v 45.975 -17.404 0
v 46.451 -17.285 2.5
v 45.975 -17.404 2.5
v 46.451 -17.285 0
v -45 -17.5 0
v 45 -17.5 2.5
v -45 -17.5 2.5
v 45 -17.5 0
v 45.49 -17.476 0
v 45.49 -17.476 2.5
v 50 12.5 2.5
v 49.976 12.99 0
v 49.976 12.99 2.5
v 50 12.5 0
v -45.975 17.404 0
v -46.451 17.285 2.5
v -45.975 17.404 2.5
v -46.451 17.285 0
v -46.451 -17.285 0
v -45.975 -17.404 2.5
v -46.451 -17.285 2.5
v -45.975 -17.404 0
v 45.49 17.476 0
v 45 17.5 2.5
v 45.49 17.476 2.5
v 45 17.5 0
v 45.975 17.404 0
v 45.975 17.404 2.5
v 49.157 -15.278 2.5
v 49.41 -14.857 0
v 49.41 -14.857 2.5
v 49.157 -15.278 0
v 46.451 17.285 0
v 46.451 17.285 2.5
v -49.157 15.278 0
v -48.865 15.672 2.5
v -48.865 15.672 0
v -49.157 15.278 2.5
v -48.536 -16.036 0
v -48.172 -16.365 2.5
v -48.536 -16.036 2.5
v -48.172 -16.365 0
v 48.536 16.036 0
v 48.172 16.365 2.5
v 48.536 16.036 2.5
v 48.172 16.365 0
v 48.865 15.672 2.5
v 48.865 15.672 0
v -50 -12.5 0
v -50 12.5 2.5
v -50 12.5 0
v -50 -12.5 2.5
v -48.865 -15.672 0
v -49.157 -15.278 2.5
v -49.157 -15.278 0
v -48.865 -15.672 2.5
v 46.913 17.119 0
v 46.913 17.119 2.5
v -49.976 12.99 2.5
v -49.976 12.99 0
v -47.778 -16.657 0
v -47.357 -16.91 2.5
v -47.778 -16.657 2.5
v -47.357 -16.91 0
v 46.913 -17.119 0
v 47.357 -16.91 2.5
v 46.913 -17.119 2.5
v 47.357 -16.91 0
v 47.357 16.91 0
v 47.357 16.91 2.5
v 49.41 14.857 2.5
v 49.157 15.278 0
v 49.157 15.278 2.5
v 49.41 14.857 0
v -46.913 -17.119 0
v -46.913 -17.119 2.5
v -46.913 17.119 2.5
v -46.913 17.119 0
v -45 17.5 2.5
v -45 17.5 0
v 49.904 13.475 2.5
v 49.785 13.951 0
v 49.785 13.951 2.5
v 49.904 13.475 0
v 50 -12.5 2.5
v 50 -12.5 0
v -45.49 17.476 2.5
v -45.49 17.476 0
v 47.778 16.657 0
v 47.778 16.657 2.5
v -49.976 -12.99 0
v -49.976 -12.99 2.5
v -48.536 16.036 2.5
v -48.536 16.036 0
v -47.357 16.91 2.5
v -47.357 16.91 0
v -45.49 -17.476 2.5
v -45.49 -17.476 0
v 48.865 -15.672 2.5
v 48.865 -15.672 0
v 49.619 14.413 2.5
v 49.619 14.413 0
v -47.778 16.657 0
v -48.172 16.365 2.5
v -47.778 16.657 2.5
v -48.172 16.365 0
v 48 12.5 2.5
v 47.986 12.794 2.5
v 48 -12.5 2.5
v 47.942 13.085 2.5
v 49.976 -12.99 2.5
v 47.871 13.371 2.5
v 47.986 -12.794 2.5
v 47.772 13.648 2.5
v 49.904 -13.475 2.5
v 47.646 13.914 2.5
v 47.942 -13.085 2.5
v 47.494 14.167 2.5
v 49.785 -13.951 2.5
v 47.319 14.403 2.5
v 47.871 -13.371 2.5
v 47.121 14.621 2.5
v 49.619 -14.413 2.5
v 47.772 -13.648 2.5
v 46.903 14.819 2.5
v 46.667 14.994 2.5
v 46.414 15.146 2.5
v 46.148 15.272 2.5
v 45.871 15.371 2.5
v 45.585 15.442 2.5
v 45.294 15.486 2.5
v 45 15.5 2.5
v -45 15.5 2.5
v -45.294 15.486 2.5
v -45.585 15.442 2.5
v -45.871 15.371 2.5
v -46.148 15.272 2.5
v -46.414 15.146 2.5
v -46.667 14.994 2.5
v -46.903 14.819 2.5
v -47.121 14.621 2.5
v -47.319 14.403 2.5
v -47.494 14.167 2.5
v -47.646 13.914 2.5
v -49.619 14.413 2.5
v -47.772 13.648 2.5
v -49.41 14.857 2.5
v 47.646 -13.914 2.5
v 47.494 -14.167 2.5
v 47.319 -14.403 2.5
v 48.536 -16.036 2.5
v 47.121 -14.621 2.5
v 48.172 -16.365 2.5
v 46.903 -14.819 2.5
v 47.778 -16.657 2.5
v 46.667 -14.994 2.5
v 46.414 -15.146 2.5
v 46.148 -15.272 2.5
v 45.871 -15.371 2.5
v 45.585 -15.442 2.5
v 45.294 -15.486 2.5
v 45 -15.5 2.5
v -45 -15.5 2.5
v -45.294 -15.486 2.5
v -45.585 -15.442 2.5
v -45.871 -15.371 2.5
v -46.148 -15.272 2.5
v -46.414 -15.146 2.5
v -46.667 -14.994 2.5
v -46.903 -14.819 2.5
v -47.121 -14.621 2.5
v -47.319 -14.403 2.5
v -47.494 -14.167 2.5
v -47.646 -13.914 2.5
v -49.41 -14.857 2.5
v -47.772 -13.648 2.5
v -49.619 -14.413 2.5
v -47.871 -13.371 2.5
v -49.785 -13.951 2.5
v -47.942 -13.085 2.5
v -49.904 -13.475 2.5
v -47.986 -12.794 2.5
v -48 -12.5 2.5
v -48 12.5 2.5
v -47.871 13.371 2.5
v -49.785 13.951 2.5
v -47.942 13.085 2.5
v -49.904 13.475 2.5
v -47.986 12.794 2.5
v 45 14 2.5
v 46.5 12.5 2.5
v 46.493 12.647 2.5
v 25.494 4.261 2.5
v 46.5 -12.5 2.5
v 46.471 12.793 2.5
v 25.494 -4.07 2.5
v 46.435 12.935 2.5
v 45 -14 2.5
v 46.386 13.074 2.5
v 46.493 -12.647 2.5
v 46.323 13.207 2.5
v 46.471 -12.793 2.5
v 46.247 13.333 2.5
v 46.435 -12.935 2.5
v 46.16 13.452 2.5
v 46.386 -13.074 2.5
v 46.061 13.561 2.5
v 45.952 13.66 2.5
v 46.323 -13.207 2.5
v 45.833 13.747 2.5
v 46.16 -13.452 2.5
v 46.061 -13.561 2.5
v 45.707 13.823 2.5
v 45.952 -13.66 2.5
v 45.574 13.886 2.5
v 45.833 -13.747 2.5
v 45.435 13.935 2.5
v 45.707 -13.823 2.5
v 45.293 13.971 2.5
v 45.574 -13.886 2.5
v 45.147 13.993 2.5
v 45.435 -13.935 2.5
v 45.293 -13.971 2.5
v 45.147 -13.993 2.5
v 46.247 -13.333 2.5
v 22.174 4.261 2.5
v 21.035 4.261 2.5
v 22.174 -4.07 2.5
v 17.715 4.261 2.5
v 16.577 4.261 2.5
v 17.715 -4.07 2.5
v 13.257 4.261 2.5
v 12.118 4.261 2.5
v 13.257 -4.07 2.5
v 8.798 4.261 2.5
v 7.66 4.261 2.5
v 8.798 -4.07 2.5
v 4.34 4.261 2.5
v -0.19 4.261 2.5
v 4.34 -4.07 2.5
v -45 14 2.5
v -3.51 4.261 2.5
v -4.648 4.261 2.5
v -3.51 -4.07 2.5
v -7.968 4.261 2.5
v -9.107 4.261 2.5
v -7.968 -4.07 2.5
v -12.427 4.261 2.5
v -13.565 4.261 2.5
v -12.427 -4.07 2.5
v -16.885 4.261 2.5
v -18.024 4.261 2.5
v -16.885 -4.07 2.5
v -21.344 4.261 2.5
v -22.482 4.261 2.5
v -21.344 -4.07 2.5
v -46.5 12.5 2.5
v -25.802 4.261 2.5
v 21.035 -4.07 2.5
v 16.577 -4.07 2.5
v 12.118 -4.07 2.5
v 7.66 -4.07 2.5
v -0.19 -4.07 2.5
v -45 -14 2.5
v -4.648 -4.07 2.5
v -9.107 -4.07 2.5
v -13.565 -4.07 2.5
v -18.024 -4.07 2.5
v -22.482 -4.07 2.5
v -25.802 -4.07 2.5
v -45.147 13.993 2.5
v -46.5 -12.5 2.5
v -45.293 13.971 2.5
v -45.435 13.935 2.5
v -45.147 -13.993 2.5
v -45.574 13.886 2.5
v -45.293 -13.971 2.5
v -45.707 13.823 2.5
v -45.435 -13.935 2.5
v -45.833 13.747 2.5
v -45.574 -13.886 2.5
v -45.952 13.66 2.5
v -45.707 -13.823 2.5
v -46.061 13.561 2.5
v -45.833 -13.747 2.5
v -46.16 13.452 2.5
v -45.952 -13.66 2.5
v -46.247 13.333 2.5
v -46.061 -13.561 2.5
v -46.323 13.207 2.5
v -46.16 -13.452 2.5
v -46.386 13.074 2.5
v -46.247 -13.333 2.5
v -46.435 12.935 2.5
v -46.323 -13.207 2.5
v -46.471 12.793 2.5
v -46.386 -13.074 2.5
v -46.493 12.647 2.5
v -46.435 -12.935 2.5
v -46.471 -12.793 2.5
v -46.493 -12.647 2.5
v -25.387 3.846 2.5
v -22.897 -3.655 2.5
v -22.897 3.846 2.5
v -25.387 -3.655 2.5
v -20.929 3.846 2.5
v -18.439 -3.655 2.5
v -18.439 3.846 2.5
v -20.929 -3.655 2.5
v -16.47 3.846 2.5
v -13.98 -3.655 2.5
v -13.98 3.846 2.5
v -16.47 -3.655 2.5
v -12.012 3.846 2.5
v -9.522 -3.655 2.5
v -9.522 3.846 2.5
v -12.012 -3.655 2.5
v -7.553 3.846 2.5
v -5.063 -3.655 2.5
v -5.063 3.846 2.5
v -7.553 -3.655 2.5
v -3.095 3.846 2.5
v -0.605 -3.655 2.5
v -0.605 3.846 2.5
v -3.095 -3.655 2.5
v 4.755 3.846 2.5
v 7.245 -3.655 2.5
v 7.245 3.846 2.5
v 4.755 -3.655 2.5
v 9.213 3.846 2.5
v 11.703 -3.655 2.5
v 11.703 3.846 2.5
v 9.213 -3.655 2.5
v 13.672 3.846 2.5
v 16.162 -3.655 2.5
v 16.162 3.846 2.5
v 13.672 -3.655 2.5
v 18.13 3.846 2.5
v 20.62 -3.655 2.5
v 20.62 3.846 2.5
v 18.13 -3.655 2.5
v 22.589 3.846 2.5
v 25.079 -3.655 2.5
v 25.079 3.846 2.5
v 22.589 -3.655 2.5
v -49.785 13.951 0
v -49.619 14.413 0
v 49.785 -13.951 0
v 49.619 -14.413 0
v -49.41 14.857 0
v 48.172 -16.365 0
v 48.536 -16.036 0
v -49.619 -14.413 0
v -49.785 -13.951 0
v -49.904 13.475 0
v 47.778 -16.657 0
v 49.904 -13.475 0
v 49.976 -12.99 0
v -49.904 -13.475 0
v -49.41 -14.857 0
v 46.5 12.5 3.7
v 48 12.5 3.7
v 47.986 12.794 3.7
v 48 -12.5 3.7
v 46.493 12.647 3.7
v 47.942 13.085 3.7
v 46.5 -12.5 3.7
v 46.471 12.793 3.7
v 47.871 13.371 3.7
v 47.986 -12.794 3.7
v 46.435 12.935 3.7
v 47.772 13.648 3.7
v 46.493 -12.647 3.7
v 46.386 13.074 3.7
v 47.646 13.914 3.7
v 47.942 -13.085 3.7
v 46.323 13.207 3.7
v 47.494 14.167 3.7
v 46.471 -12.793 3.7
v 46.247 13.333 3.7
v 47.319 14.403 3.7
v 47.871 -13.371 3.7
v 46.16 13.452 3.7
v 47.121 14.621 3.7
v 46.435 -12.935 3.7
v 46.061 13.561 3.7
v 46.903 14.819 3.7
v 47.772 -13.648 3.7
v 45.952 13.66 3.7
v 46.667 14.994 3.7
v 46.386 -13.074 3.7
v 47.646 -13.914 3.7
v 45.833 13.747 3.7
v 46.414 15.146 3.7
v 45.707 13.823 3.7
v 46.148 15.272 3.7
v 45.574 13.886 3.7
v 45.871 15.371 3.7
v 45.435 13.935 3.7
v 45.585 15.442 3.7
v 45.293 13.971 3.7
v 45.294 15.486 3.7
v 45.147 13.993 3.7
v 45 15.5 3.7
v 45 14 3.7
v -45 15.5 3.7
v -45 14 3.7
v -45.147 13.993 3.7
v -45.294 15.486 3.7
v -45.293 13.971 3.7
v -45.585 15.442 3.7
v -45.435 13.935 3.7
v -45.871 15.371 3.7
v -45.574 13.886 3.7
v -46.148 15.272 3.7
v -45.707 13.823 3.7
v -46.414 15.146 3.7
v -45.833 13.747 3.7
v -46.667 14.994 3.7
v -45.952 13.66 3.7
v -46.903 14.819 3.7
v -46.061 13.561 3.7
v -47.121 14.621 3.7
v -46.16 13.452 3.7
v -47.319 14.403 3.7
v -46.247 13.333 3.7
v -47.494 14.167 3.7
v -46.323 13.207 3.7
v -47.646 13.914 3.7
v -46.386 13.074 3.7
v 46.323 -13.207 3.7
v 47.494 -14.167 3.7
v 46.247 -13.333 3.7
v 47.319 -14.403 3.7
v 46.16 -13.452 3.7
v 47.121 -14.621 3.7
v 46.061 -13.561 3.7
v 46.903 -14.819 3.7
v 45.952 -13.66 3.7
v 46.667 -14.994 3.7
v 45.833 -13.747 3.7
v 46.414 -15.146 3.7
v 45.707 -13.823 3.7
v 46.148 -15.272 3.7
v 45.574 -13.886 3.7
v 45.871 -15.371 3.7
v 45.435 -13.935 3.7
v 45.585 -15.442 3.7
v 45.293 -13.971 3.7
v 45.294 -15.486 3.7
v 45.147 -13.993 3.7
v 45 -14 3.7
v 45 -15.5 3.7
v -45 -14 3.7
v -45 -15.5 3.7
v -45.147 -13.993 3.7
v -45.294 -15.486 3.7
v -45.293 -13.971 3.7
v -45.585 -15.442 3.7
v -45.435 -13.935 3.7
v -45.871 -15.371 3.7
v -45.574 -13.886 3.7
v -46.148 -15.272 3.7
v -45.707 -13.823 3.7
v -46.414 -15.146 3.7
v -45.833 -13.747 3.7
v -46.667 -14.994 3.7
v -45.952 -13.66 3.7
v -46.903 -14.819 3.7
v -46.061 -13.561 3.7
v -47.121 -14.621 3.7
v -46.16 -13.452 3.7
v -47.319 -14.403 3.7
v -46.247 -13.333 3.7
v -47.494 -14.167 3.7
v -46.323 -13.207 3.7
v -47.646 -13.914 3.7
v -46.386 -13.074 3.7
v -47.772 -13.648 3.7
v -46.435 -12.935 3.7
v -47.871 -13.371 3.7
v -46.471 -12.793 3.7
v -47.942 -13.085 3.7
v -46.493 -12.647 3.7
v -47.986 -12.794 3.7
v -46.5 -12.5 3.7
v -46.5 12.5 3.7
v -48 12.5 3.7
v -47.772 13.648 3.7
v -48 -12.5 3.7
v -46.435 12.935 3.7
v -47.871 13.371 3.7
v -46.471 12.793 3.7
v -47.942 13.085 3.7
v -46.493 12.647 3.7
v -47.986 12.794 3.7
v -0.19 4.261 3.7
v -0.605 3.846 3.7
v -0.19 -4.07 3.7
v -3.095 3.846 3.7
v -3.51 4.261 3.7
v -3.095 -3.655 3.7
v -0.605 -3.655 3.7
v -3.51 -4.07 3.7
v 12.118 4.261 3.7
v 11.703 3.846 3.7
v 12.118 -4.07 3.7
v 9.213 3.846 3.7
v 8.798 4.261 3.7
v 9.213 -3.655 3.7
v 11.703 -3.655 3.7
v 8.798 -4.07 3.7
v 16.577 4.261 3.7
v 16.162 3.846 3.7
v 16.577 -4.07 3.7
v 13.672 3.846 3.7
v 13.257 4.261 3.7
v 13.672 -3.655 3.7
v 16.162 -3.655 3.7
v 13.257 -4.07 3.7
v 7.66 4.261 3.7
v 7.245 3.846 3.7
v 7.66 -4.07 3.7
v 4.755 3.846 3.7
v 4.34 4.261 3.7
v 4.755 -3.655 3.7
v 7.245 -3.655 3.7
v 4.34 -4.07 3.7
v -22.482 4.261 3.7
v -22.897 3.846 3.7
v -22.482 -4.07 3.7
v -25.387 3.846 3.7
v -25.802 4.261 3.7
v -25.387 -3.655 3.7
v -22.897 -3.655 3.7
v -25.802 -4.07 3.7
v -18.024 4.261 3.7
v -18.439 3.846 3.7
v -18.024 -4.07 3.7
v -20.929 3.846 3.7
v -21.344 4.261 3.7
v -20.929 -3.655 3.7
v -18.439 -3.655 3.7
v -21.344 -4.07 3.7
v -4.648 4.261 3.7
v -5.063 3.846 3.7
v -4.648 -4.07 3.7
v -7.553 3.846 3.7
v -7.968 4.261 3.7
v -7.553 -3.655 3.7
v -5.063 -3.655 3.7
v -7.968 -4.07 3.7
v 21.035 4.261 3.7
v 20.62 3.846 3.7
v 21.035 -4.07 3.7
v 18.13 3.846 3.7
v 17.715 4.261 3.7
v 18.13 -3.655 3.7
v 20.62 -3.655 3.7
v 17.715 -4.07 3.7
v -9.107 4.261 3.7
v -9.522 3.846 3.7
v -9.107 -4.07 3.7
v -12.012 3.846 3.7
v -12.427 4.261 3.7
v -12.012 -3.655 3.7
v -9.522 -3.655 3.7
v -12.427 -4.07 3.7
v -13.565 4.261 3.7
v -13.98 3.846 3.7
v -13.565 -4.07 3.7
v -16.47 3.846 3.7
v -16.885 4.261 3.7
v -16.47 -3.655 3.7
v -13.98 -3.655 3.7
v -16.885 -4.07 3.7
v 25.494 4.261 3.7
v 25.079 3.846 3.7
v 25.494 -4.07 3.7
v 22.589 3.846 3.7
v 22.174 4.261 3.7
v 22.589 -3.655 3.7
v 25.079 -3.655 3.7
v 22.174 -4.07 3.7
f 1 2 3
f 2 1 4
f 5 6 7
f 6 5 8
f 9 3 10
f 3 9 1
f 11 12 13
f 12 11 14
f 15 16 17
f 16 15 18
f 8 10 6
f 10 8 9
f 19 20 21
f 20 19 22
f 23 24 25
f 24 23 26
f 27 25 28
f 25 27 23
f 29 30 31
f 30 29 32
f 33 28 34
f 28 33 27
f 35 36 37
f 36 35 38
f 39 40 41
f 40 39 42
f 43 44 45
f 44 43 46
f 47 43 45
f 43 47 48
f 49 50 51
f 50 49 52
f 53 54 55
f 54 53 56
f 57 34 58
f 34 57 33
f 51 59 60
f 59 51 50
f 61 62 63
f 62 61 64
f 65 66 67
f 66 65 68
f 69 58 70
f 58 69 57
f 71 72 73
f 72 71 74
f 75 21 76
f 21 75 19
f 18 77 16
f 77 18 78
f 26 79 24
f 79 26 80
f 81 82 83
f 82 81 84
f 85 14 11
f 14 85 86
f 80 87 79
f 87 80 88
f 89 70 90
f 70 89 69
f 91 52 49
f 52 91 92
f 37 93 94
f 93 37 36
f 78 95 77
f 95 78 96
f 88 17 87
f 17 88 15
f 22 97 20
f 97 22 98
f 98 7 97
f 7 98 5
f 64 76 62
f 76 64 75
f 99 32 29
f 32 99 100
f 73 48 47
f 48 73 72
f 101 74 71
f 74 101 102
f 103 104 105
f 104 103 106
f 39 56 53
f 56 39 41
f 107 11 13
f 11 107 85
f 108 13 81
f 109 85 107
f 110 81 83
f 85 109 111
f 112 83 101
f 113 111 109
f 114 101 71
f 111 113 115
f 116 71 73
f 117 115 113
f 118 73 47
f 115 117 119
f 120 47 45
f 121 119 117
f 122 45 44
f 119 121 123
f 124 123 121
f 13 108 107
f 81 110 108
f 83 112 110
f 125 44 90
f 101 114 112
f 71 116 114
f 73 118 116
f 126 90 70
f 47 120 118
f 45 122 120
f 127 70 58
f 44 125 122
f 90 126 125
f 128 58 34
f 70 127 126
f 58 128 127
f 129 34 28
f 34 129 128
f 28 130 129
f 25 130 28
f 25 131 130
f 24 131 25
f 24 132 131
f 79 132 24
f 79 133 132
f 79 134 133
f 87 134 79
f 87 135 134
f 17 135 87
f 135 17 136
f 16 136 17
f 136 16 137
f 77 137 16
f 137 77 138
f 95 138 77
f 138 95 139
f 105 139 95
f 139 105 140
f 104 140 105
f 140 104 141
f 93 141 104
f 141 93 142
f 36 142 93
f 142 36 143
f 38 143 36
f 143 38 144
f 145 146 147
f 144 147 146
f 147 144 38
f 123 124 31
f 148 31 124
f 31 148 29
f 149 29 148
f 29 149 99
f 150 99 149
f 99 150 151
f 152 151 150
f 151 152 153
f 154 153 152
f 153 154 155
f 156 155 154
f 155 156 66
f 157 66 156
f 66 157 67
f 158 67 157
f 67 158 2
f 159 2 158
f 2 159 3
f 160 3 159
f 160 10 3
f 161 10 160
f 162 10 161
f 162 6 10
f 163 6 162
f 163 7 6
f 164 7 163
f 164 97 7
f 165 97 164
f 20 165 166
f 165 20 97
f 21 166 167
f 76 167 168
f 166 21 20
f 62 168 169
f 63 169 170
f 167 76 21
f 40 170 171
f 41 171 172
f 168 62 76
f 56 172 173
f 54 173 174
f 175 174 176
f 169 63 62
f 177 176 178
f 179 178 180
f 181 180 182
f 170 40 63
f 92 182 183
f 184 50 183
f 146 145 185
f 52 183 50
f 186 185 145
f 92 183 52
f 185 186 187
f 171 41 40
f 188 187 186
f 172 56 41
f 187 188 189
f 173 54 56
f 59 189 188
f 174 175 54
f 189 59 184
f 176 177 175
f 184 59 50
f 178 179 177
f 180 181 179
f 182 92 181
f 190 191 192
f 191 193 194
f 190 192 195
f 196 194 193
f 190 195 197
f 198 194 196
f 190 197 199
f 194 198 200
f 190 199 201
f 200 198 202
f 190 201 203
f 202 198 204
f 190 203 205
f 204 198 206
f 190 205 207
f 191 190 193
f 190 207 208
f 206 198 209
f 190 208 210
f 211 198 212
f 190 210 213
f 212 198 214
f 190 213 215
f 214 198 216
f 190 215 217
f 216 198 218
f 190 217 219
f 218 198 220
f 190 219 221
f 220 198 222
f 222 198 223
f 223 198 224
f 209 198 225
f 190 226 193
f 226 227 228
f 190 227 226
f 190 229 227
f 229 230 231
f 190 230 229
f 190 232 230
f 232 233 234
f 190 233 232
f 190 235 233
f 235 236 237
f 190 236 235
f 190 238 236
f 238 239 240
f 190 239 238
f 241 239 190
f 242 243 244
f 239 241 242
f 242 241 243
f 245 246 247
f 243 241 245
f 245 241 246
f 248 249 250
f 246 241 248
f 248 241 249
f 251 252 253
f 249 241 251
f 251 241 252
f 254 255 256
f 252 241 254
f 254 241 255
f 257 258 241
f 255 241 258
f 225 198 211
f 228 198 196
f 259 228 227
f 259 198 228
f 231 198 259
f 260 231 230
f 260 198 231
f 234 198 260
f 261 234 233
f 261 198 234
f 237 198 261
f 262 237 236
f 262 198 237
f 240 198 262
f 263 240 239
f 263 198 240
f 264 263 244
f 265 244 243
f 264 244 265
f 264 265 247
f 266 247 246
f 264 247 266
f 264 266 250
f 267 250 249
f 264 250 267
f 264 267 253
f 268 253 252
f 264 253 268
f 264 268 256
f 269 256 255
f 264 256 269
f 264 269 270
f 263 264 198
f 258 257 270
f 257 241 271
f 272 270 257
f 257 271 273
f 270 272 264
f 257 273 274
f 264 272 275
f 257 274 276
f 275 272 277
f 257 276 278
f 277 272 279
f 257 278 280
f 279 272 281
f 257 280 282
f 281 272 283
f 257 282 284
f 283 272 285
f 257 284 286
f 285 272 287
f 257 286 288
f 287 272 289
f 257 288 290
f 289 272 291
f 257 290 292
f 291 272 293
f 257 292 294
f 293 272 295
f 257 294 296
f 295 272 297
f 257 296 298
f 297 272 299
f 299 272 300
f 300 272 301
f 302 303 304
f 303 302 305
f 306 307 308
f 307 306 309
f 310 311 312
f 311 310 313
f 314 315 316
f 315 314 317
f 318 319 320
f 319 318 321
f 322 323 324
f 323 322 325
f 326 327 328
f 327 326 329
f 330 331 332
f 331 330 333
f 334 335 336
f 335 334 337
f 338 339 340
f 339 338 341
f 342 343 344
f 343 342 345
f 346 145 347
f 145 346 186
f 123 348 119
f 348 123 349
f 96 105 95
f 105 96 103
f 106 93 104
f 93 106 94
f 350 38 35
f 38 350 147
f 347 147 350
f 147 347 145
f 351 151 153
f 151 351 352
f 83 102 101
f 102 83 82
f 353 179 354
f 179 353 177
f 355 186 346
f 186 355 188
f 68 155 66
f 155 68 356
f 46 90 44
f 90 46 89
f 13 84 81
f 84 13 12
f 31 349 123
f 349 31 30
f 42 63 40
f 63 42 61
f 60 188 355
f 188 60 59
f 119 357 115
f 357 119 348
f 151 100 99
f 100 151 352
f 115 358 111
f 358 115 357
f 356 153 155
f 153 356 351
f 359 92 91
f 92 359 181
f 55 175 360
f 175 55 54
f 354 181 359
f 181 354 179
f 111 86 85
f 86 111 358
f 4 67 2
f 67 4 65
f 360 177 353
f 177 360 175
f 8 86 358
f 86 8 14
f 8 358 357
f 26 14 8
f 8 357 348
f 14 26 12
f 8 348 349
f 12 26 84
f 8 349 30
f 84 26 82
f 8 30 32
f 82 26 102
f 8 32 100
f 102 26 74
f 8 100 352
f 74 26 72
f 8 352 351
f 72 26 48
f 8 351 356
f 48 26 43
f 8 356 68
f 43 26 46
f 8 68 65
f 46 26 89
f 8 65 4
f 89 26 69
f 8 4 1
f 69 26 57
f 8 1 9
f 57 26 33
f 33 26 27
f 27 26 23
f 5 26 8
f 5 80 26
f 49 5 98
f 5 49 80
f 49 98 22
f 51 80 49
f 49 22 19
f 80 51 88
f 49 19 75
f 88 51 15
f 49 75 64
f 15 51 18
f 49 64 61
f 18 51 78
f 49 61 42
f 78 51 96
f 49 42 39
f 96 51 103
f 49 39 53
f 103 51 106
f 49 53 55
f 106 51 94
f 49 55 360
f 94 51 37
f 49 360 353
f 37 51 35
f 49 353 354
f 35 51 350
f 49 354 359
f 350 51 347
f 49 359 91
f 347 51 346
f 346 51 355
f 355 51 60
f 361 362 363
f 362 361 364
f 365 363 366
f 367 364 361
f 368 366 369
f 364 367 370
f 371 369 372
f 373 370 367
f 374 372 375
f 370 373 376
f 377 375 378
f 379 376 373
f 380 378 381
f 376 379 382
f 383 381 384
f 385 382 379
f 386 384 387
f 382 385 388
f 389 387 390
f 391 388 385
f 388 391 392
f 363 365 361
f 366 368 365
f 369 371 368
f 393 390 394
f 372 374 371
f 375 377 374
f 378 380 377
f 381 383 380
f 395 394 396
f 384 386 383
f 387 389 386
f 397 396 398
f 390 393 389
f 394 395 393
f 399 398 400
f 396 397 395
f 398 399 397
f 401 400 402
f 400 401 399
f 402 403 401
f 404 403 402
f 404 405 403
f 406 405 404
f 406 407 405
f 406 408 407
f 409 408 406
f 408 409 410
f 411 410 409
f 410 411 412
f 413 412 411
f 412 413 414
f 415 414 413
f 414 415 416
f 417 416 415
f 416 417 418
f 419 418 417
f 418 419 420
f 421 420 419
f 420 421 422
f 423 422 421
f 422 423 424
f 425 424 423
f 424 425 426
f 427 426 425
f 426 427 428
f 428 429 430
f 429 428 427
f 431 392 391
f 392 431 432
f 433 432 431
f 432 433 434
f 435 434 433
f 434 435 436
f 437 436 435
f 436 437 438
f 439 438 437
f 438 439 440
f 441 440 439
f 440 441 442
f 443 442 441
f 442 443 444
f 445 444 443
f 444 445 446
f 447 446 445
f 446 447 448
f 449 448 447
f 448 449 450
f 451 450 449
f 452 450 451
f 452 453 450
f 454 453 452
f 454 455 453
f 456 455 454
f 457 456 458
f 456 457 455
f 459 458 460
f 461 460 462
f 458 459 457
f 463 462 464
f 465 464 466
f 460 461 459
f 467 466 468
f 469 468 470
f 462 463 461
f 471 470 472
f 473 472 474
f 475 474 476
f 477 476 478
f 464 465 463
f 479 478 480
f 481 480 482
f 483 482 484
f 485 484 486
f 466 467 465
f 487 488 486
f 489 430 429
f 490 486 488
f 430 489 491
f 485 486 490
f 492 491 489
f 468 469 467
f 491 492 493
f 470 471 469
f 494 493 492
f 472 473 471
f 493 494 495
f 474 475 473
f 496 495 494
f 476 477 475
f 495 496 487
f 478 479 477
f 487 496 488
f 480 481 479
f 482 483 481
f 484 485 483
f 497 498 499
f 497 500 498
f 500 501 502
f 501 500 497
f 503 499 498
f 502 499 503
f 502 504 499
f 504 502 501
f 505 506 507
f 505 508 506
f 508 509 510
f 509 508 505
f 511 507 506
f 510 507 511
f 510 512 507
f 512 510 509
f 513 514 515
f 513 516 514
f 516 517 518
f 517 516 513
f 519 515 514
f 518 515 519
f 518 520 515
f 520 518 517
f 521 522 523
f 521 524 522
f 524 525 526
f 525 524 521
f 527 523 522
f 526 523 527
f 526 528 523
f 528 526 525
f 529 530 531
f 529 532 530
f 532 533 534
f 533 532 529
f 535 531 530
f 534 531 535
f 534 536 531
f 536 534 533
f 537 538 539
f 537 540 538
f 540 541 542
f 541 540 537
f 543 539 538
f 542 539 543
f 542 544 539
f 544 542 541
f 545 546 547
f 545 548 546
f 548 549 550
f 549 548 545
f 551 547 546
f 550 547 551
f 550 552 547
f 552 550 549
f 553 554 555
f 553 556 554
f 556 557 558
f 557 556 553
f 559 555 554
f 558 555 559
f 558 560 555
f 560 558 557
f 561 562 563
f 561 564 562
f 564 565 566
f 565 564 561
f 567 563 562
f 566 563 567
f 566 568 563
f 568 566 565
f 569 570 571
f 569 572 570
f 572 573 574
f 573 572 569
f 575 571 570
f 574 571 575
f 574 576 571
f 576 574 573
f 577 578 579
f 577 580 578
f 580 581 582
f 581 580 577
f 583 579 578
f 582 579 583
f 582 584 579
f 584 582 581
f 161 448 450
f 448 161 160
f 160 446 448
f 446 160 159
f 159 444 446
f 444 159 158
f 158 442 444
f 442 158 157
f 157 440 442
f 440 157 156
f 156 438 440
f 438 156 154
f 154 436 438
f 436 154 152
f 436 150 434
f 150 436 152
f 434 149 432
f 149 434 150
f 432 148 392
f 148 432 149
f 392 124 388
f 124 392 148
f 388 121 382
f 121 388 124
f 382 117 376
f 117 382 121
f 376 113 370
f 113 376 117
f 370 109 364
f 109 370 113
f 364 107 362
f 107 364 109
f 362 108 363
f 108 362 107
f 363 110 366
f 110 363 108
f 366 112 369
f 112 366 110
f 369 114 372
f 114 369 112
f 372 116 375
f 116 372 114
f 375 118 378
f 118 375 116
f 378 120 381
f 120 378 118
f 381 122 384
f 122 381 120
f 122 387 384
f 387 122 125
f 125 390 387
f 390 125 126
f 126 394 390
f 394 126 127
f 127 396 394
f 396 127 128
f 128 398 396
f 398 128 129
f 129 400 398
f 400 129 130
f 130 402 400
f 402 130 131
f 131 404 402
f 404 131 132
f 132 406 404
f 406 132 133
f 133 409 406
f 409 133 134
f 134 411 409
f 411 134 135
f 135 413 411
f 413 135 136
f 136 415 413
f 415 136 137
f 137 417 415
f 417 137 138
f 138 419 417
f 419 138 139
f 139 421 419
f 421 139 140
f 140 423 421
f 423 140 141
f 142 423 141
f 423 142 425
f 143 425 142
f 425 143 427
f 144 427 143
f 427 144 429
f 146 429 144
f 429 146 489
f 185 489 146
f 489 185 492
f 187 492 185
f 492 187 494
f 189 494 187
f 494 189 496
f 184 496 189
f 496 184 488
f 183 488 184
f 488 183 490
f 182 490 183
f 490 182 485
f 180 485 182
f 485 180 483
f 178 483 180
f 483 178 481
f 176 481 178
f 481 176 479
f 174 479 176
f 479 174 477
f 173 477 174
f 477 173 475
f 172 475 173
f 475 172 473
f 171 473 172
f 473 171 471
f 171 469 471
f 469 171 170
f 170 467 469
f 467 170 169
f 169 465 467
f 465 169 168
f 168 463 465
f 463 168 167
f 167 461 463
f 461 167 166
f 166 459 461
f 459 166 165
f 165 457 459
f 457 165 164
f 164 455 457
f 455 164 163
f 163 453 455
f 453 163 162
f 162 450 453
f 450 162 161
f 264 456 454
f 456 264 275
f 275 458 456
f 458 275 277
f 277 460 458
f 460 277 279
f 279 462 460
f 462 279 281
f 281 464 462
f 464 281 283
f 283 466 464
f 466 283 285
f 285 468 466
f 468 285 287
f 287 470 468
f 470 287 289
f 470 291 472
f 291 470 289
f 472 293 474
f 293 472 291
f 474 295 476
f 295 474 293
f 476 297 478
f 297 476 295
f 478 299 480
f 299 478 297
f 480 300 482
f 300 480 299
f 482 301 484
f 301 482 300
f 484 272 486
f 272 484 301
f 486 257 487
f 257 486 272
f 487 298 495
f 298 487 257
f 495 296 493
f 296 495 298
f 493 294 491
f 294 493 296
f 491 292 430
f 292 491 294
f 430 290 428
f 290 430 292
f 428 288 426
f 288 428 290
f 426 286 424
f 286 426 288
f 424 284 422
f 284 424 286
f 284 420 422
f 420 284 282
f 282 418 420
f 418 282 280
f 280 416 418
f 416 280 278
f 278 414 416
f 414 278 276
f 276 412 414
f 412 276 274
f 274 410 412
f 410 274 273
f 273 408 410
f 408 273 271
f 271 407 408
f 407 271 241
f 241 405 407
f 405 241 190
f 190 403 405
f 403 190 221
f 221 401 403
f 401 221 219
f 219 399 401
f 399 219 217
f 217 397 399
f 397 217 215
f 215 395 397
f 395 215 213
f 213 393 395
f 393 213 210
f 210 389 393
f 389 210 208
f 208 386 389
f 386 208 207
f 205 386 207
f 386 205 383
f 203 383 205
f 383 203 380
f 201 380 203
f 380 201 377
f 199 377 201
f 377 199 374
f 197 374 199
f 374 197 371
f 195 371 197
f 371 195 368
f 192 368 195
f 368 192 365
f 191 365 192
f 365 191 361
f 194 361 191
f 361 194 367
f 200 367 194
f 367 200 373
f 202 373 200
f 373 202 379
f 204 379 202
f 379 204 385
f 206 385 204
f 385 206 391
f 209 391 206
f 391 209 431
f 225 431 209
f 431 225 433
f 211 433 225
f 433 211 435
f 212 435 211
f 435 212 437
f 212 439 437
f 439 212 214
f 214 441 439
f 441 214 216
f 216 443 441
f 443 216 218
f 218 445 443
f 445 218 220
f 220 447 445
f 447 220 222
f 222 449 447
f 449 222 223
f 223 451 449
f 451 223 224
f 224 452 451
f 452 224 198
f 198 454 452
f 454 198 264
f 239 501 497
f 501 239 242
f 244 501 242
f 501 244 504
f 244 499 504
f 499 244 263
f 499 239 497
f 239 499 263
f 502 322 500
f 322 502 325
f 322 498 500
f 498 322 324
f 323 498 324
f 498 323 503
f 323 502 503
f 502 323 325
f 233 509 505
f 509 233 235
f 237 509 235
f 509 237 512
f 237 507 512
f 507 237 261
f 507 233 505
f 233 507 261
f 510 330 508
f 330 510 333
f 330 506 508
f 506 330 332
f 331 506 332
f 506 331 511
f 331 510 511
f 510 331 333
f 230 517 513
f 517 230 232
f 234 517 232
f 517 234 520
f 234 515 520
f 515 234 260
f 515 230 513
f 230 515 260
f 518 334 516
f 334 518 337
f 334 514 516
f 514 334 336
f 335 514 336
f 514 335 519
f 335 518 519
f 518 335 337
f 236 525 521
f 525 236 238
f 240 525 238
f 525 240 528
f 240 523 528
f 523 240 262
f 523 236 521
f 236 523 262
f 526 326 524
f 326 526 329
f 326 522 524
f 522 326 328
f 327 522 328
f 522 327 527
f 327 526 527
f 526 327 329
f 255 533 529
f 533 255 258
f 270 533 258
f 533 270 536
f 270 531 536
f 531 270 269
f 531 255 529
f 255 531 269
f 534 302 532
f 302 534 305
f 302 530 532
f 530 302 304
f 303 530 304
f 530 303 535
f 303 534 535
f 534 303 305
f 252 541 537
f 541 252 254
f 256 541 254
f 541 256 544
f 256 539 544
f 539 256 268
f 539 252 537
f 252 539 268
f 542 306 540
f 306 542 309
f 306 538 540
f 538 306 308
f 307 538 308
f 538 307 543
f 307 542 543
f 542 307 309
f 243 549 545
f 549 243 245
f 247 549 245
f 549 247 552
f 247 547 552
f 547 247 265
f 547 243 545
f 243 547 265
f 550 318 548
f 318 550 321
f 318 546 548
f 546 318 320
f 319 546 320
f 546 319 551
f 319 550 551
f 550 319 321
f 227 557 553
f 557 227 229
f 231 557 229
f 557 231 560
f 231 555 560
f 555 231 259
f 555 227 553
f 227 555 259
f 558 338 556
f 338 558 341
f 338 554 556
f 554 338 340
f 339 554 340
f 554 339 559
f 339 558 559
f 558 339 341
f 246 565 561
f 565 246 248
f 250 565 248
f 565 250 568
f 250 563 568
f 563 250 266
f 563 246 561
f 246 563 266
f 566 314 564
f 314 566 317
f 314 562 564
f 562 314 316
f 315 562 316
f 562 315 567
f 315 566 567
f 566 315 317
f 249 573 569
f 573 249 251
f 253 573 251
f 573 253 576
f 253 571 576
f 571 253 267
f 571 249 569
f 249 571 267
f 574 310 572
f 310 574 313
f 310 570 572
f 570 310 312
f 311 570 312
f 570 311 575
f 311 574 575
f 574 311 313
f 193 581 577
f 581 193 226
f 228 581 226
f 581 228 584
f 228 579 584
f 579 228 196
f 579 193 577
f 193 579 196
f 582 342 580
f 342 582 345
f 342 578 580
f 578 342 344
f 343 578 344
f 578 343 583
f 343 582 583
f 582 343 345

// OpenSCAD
// =====================================================
//  Customizable Mailbox Name Tag - Embossed Text
//  Open in OpenSCAD -> Window -> Customizer to edit
// =====================================================

/* [Text] */
// First line (e.g. family name)
line1 = "משפחת ישראלי";
// Second line (leave empty for a single line)
line2 = "";
// Font - use any installed font. For Hebrew try "Arial:style=Bold", "David Libre", "Rubik:style=Bold"
font_name = "Liberation Sans:style=Bold";
// Line 1 text height (mm)
line1_size = 9;
// Line 2 text height (mm)
line2_size = 6;
// Space between lines (mm)
line_spacing = 4;
// How far the text rises above the plate (mm)
text_height = 1.2;
// Text direction - "auto" detects Hebrew automatically (כיוון כתב - auto מזהה עברית אוטומטית)
text_direction = "auto"; // [auto, ltr, rtl]
// Shrink text automatically if it is wider than the plate
auto_fit = true;

/* [Plate] */
plate_width = 100;
plate_height = 35;
plate_thickness = 2.5;
// Corner radius (0 = sharp corners)
corner_radius = 5;

/* [Border] */
add_border = true;
border_width = 1.5;
// Gap between plate edge and border (mm)
border_inset = 2;

/* [Mounting] */
// Enable screw mounting holes
add_holes = false;
// Screw shaft diameter (mm)
hole_diameter = 3.5;
// Countersink head diameter (0 = no countersink)
countersink_diameter = 7;
// Hole distance from left/right edge (mm)
hole_edge_offset = 9;

/* [Render] */
// Choose "all" for single-color print, or export plate & text separately for 2-color prints
part = "all"; // [all, plate, text]

/* [Hidden] */
$fn = 64;
eps = 0.01;

// ---------- derived values ----------
has_line2 = len(line2) > 0;
has_holes = add_holes;
// Usable text width - leave room for border and holes
text_area_w = plate_width
              - 2 * (add_border ? border_inset + border_width + 2 : 3)
              - (has_holes ? 2 * (hole_edge_offset + max(hole_diameter, countersink_diameter) / 2) : 0);
text_area_h = plate_height - 2 * (add_border ? border_inset + border_width + 1.5 : 3);

block_h = has_line2 ? line1_size + line_spacing + line2_size : line1_size;
// Vertical scale-down if the text block is too tall
v_fit = auto_fit ? min(1, text_area_h / block_h) : 1;

// ---------- modules ----------
module rounded_rect(w, h, r) {
    r2 = min(r, w / 2 - eps, h / 2 - eps);
    if (r2 <= 0) square([w, h], center = true);
    else offset(r = r2) square([w - 2 * r2, h - 2 * r2], center = true);
}

// --- Hebrew / RTL support (תמיכה בעברית) ---
// Hebrew letters are Unicode U+0590..U+05FF
function is_hebrew_char(c) = ord(c) >= 1424 && ord(c) <= 1535;
function has_hebrew(s, i = 0) =
    i >= len(s) ? false : is_hebrew_char(s[i]) ? true : has_hebrew(s, i + 1);

// In "rtl" mode OpenSCAD lays out every character right-to-left, so numbers
// and English words inside a Hebrew line come out reversed (12 -> 21).
// Pre-reverse each run of non-Hebrew, non-space characters to cancel that.
function is_ltr_char(c) = !is_hebrew_char(c) && c != " ";
function run_end(s, i) = (i < len(s) && is_ltr_char(s[i])) ? run_end(s, i + 1) : i;
function rev_sub(s, a, b) = b <= a ? "" : str(s[b - 1], rev_sub(s, a, b - 1));
function fix_rtl(s, i = 0) =
    i >= len(s) ? "" :
    is_ltr_char(s[i]) ? str(rev_sub(s, i, run_end(s, i)), fix_rtl(s, run_end(s, i)))
                      : str(s[i], fix_rtl(s, i + 1));

// Direction per line: "auto" -> rtl if the line contains any Hebrew letter
function line_dir(s) = text_direction == "auto" ? (has_hebrew(s) ? "rtl" : "ltr")
                                                : text_direction;

module text_line(s, size) {
    d = line_dir(s);
    text(d == "rtl" ? fix_rtl(s) : s,
         size = size, font = font_name,
         halign = "center", valign = "center",
         direction = d);
}

// Shrinks a line proportionally if its estimated width exceeds the text area.
// Estimate: average bold glyph is ~0.7 x font size wide.
module fitted_line(s, size) {
    est_w = len(s) * size * 0.7;
    k = auto_fit ? min(1, text_area_w / max(est_w, eps)) : 1;
    scale([k, k]) text_line(s, size);
}

module text_2d() {
    scale([v_fit, v_fit]) {
        if (has_line2) {
            y1 = block_h / 2 - line1_size / 2;
            y2 = -block_h / 2 + line2_size / 2;
            translate([0, y1]) fitted_line(line1, line1_size);
            translate([0, y2]) fitted_line(line2, line2_size);
        } else {
            fitted_line(line1, line1_size);
        }
    }
}

module border_2d() {
    ow = plate_width - 2 * border_inset;
    oh = plate_height - 2 * border_inset;
    r  = max(corner_radius - border_inset, 0);
    difference() {
        rounded_rect(ow, oh, r);
        rounded_rect(ow - 2 * border_width, oh - 2 * border_width,
                     max(r - border_width, 0));
    }
}

module hole_positions() {
    for (sx = [-1, 1])
        translate([sx * (plate_width / 2 - hole_edge_offset), 0, 0]) children();
}

module mounting_holes() {
    hole_positions() {
        translate([0, 0, -1]) cylinder(d = hole_diameter, h = plate_thickness + 2);
        if (countersink_diameter > hole_diameter) {
            cs_depth = (countersink_diameter - hole_diameter) / 2; // 90° countersink
            translate([0, 0, plate_thickness - cs_depth])
                cylinder(d1 = hole_diameter, d2 = countersink_diameter, h = cs_depth + eps);
            translate([0, 0, plate_thickness])
                cylinder(d = countersink_diameter, h = text_height + 1);
        }
    }
}

module plate() {
    difference() {
        linear_extrude(plate_thickness) rounded_rect(plate_width, plate_height, corner_radius);
        if (has_holes) mounting_holes();
    }
}

module raised() {
    difference() {
        translate([0, 0, plate_thickness - eps])
            linear_extrude(text_height + eps) {
                text_2d();
                if (add_border) border_2d();
            }
        if (has_holes) mounting_holes();
    }
}

// ---------- output ----------
if (part == "all" || part == "plate") color("white") plate();
if (part == "all" || part == "text")  color("navy")  raised();
